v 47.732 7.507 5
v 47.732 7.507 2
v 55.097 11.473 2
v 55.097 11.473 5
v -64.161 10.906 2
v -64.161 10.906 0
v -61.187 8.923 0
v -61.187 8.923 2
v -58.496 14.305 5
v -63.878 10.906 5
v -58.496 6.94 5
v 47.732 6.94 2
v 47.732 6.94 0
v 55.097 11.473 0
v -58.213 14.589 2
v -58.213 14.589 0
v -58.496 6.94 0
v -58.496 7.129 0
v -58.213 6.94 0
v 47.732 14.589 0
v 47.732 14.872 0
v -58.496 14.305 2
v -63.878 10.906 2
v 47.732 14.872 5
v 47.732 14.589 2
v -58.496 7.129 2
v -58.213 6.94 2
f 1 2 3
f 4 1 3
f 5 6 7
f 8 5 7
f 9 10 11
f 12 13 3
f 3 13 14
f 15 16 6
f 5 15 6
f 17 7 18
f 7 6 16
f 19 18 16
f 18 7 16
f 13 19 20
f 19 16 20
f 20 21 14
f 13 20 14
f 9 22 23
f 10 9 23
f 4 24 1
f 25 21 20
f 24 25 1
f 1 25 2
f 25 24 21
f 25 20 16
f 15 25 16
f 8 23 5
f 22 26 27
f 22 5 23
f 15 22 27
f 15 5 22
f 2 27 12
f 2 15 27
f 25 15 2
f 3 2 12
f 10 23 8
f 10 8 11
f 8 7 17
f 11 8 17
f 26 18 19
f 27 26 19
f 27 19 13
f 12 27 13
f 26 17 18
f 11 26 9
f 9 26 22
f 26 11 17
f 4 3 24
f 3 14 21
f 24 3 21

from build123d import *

# Parameters (mm, degrees)
F1_DEPTH = 2
F3_DEPTH = 5
F5_DEPTH = 5


with BuildPart() as f1:
    # F0 (on Top) → F1 (new body)
    with BuildSketch(Plane.XY):
        Polygon((47.731567, 14.58858), (-58.212683, 14.58858), (-64.16142, 10.906025), (-58.212683, 6.940198), (47.731567, 6.940198), (55.096671, 11.472573), align=None)
    extrude(amount=F1_DEPTH)

    # F2 (on Top) → F3 (join)
    with BuildSketch(Plane.XY):
        Polygon((-58.495954, 14.305307), (-63.878149, 10.906025), (-58.495954, 6.940198), align=None)
    extrude(amount=F3_DEPTH)

    # F4 (on Top) → F5 (join)
    with BuildSketch(Plane.XY):
        Polygon((55.096671, 11.472573), (47.731567, 14.871853), (47.731567, 7.506745), align=None)
    extrude(amount=F5_DEPTH)


solid = f1.part
